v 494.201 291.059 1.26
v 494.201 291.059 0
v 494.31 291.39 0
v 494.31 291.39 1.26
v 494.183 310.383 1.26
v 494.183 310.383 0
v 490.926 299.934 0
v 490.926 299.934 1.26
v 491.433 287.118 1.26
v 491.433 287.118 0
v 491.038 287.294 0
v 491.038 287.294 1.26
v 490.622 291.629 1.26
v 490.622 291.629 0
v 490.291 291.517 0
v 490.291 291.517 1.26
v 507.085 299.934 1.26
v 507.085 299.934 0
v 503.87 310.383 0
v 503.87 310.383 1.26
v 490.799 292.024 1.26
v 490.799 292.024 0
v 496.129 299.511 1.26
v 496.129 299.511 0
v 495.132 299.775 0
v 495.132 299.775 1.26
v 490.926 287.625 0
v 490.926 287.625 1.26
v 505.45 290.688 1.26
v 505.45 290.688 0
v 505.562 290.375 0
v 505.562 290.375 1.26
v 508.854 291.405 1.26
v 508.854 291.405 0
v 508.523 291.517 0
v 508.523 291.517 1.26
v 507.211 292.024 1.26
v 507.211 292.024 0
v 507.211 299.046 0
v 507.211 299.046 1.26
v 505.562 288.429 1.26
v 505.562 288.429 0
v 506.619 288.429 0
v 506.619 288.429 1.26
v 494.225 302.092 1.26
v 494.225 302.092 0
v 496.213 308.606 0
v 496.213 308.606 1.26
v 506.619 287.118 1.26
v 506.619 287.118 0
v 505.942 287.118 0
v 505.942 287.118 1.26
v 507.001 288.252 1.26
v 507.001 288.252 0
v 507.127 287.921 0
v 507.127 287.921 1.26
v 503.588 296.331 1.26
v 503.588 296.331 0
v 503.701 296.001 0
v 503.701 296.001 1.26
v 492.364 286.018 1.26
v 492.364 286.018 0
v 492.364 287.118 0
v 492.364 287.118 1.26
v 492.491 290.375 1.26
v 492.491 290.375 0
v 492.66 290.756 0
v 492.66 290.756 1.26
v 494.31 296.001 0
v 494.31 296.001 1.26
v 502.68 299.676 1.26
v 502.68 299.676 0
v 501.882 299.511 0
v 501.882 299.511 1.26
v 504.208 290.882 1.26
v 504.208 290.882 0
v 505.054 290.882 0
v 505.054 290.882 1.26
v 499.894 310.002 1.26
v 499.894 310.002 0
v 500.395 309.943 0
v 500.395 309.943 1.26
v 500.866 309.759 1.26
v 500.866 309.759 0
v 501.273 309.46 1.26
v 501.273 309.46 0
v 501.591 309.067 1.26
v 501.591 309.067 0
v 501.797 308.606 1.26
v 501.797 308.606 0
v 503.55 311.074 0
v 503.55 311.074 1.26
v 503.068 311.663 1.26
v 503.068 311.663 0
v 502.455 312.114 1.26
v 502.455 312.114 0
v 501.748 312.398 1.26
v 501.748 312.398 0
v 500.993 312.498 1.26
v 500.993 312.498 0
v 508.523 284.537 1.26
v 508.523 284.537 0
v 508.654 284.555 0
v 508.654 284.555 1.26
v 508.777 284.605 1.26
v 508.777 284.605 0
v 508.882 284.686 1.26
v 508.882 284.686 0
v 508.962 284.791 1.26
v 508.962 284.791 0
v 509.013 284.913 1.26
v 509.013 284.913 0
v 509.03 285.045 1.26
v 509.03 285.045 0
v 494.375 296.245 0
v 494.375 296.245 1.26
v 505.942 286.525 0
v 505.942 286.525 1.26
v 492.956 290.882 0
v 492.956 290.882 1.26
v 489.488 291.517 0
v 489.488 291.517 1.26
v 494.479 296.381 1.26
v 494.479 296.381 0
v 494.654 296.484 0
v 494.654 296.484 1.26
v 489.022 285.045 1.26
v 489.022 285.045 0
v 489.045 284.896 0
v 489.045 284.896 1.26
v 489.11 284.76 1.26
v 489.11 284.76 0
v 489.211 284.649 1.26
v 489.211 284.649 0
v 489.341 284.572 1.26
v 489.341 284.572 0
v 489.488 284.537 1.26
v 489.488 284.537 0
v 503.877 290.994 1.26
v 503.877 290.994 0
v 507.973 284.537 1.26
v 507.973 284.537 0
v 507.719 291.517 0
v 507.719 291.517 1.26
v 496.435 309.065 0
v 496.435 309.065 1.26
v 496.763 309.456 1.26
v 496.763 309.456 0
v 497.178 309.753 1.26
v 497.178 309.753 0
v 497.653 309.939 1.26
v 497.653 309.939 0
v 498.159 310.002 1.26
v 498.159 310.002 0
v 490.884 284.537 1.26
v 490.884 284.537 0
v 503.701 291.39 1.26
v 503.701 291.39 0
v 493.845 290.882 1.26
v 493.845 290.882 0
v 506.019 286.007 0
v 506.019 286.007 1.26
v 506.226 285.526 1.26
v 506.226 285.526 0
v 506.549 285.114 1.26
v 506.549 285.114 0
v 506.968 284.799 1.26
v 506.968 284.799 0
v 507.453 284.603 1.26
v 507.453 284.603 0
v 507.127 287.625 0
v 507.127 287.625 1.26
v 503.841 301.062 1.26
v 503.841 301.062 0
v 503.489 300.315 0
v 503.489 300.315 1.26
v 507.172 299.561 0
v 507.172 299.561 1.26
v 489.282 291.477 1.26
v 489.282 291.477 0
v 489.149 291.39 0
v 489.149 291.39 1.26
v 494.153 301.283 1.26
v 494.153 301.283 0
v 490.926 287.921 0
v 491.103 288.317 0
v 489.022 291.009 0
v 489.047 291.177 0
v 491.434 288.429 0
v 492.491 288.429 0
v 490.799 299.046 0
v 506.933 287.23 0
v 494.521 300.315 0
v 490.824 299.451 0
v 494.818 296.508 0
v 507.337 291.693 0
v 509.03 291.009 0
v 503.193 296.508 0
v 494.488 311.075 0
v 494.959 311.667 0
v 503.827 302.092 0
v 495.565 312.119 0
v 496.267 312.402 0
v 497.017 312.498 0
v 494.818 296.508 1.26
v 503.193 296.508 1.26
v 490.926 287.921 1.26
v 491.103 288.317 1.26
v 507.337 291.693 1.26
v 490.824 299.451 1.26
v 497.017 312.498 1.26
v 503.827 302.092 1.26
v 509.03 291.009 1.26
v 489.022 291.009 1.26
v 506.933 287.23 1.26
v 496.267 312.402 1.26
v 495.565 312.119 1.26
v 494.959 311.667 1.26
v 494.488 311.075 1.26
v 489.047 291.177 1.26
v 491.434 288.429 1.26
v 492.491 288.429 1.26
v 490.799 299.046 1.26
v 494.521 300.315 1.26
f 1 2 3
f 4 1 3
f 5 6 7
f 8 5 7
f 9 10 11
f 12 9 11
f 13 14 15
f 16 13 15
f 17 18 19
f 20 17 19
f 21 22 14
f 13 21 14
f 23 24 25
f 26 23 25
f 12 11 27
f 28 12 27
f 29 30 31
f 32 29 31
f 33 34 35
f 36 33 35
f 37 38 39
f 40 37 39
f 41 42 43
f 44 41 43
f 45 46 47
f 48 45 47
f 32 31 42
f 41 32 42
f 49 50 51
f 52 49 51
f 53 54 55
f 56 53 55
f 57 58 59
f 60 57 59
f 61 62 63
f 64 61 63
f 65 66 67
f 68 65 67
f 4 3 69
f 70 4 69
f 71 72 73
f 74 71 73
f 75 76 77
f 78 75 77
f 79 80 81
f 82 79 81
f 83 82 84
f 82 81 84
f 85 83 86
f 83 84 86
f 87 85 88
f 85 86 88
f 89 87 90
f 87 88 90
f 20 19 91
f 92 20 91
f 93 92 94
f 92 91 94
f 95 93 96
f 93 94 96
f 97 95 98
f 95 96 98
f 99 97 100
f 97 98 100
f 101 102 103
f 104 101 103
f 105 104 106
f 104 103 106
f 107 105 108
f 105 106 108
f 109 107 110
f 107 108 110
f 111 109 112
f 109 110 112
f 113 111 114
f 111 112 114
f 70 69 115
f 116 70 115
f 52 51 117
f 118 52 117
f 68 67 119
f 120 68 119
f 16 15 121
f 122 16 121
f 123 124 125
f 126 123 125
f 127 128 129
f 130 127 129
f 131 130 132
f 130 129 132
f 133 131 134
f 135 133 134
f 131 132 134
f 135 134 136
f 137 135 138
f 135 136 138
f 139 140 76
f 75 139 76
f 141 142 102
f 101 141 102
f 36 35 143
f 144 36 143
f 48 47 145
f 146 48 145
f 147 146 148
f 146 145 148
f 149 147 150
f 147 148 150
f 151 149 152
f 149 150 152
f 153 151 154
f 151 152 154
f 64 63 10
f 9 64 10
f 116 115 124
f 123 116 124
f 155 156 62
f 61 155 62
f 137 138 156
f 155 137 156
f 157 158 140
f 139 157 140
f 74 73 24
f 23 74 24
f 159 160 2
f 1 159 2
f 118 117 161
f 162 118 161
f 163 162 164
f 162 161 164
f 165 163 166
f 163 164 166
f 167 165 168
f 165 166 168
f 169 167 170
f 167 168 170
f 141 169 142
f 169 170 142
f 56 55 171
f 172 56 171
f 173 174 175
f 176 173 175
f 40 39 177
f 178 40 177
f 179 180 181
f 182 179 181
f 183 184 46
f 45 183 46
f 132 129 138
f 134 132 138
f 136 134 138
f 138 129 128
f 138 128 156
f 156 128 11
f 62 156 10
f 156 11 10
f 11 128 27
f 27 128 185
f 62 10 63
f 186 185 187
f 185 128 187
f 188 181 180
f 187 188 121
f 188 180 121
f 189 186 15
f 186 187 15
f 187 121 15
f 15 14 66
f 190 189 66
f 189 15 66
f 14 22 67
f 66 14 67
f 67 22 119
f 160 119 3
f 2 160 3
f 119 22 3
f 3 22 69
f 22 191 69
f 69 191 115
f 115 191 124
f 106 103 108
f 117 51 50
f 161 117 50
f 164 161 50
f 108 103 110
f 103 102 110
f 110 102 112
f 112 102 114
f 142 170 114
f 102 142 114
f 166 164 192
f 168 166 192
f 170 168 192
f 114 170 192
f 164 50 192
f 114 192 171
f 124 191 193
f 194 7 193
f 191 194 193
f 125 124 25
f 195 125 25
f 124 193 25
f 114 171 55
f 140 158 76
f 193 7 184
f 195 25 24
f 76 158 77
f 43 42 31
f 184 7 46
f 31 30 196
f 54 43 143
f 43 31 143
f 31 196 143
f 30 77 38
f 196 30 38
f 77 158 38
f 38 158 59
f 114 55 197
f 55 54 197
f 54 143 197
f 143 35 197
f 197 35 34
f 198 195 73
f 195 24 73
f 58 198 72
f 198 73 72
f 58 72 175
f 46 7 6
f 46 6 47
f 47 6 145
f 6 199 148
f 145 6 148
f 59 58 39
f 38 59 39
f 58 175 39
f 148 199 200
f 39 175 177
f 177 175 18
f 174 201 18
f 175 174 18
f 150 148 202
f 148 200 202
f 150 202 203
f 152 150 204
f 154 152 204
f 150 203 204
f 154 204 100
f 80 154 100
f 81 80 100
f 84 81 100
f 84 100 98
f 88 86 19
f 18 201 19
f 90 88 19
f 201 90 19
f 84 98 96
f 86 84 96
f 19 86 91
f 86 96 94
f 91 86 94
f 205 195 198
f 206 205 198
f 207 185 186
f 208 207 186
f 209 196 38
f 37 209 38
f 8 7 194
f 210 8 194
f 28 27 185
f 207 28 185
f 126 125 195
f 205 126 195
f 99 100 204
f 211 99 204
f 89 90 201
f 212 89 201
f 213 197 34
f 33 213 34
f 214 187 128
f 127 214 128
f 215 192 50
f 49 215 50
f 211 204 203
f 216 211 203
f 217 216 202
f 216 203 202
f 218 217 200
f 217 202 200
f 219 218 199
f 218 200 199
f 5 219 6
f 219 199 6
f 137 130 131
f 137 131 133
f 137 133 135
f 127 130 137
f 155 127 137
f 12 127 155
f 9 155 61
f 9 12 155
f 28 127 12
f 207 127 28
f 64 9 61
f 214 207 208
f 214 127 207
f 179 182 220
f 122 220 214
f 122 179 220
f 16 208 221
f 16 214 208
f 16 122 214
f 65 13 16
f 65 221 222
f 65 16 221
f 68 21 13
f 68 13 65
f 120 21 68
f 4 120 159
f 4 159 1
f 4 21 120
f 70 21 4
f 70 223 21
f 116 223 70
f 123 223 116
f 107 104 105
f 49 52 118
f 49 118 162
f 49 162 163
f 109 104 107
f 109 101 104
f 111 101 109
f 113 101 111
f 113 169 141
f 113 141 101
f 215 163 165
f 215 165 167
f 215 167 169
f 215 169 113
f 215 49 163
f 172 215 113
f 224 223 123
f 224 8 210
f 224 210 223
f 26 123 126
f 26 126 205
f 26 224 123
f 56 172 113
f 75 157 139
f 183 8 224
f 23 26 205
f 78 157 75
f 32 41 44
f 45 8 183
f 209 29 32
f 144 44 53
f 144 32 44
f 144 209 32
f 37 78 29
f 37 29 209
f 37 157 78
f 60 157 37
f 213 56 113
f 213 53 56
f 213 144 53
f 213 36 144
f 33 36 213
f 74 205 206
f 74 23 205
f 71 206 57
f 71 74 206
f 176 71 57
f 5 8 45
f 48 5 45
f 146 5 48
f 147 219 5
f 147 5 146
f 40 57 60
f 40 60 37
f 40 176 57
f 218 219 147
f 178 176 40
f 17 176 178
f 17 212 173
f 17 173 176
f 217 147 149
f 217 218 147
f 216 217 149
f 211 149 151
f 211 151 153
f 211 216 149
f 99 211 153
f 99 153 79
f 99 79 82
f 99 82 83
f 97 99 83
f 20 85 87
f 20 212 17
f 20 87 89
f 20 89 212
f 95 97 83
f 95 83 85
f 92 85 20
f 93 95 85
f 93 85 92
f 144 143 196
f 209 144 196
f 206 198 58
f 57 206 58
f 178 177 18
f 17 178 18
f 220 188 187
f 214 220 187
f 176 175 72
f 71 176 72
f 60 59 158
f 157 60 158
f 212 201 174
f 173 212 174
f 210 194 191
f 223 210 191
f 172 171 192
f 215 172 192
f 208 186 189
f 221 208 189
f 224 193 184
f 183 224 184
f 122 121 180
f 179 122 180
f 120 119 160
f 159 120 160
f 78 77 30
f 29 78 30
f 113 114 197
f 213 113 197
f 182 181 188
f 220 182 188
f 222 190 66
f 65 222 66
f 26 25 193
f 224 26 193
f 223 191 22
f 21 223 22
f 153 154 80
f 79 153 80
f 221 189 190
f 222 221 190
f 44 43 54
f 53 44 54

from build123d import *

# Parameters (mm, degrees)
EXTRUDE_1_DEPTH = 1.26


with BuildPart() as part:
    # Model → 凸台-拉伸1 (new body)
    with BuildSketch(Plane.XY):
        with BuildLine():
            Line((490.799011507, 297.269554061), (490.799011507, 293.800954061))
            Line((490.799011507, 293.800954061), (490.799011507, 292.024354061))
            Line((490.799011507, 292.024354061), (490.622317978, 291.628783411))
            Line((490.622317978, 291.628783411), (490.291411507, 291.516754061))
            Line((490.291411507, 291.516754061), (489.487672027, 291.516754061))
            Line((489.487672027, 291.516754061), (489.281948064, 291.476958221))
            Line((489.281948064, 291.476958221), (489.149260696, 291.389854061))
            Line((489.149260696, 291.389854061), (489.046979347, 291.176662061))
            Line((489.046979347, 291.176662061), (489.022411507, 291.009154061))
            Line((489.022411507, 291.009154061), (489.022411507, 285.044854061))
            ThreePointArc((489.022411507, 285.044854061), (489.156337447, 284.700557005), (489.487711507, 284.537254061))
            Line((489.487711507, 284.537254061), (490.883611507, 284.537254061))
            Line((490.883611507, 284.537254061), (492.364111507, 286.017754061))
            Line((492.364111507, 286.017754061), (492.364111507, 287.117554061))
            Line((492.364111507, 287.117554061), (491.433481153, 287.117554061))
            Line((491.433481153, 287.117554061), (491.037940858, 287.29424759))
            Line((491.037940858, 287.29424759), (490.925911507, 287.625154061))
            Line((490.925911507, 287.625154061), (490.925911507, 287.921254061))
            Line((490.925911507, 287.921254061), (491.102605037, 288.31682471))
            Line((491.102605037, 288.31682471), (491.433511507, 288.428854061))
            Line((491.433511507, 288.428854061), (492.491011507, 288.428854061))
            Line((492.491011507, 288.428854061), (492.491011507, 290.374654061))
            Line((492.491011507, 290.374654061), (492.66027648, 290.75646672))
            Line((492.66027648, 290.75646672), (492.956311507, 290.882254061))
            Line((492.956311507, 290.882254061), (493.84460586, 290.882254061))
            Line((493.84460586, 290.882254061), (494.20148544, 291.05894759))
            Line((494.20148544, 291.05894759), (494.309911507, 291.389854061))
            Line((494.309911507, 291.389854061), (494.309911507, 296.000554061))
            Line((494.309911507, 296.000554061), (494.374646074, 296.245014221))
            Line((494.374646074, 296.245014221), (494.479015049, 296.381254061))
            Line((494.479015049, 296.381254061), (494.65360679, 296.483586221))
            Line((494.65360679, 296.483586221), (494.817511507, 296.508154061))
            Line((494.817511507, 296.508154061), (503.192882713, 296.508154061))
            Line((503.192882713, 296.508154061), (503.588482157, 296.331460531))
            Line((503.588482157, 296.331460531), (503.700511507, 296.000554061))
            Line((503.700511507, 296.000554061), (503.700511507, 291.389854061))
            Line((503.700511507, 291.389854061), (503.877205037, 290.994283411))
            Line((503.877205037, 290.994283411), (504.208111507, 290.882254061))
            Line((504.208111507, 290.882254061), (505.054032978, 290.882254061))
            Line((505.054032978, 290.882254061), (505.449682157, 290.688050362))
            Line((505.449682157, 290.688050362), (505.561711507, 290.374654061))
            Line((505.561711507, 290.374654061), (505.561711507, 288.428854061))
            Line((505.561711507, 288.428854061), (506.619129356, 288.428854061))
            Line((506.619129356, 288.428854061), (507.001024166, 288.252160531))
            Line((507.001024166, 288.252160531), (507.126811507, 287.921254061))
            Line((507.126811507, 287.921254061), (507.126811507, 287.625154061))
            Line((507.126811507, 287.625154061), (506.932607808, 287.229583411))
            Line((506.932607808, 287.229583411), (506.619211507, 287.117554061))
            Line((506.619211507, 287.117554061), (505.942411507, 287.117554061))
            Line((505.942411507, 287.117554061), (505.942411507, 286.525354055))
            ThreePointArc((505.942411507, 286.525354055), (506.549193576, 285.114196381), (507.972811507, 284.537254055))
            Line((507.972811507, 284.537254055), (508.522711502, 284.537254055))
            ThreePointArc((508.522711502, 284.537254055), (508.881638908, 284.685926655), (509.030311507, 285.044854061))
            Line((509.030311507, 285.044854061), (509.030311507, 291.009154061))
            Line((509.030311507, 291.009154061), (508.853617978, 291.40472471))
            Line((508.853617978, 291.40472471), (508.522711507, 291.516754061))
            Line((508.522711507, 291.516754061), (507.718966182, 291.516754061))
            Line((507.718966182, 291.516754061), (507.337198848, 291.69344759))
            Line((507.337198848, 291.69344759), (507.211411507, 292.024354061))
            Line((507.211411507, 292.024354061), (507.211411507, 299.046154061))
            Line((507.211411507, 299.046154061), (507.171615667, 299.56111223))
            Line((507.171615667, 299.56111223), (507.084511507, 299.934454061))
            Line((507.084511507, 299.934454061), (503.869711507, 310.382554061))
            ThreePointArc((503.869711507, 310.382554061), (502.775635028, 311.908062049), (500.993311507, 312.497554061))
            Line((500.993311507, 312.497554061), (497.017111507, 312.497554061))
            ThreePointArc((497.017111507, 312.497554061), (495.247553689, 311.912414538), (494.183011507, 310.382554061))
            Line((494.183011507, 310.382554061), (490.925864157, 299.934454061))
            Line((490.925864157, 299.934454061), (490.823579347, 299.450764051))
            Line((490.823579347, 299.450764051), (490.799011507, 299.046154061))
            Line((490.799011507, 299.046154061), (490.799011507, 297.269554061))
        make_face()
        with BuildLine():
            Line((499.005211507, 310.001854061), (499.893511507, 310.001854061))
            ThreePointArc((499.893511507, 310.001854061), (501.078970997, 309.62259882), (501.797011507, 308.605954061))
            Line((501.797011507, 308.605954061), (503.827347931, 302.091754061))
            Line((503.827347931, 302.091754061), (503.840525184, 301.061837722))
            Line((503.840525184, 301.061837722), (503.4889366, 300.315154061))
            Line((503.4889366, 300.315154061), (502.680170534, 299.676222374))
            Line((502.680170534, 299.676222374), (501.881611507, 299.511454061))
            Line((501.881611507, 299.511454061), (499.005211507, 299.511454061))
            Line((499.005211507, 299.511454061), (496.12871426, 299.511454061))
            Line((496.12871426, 299.511454061), (495.132361574, 299.775167827))
            Line((495.132361574, 299.775167827), (494.521372494, 300.315154061))
            Line((494.521372494, 300.315154061), (494.15297783, 301.28253408))
            Line((494.15297783, 301.28253408), (494.225311507, 302.091754061))
            Line((494.225311507, 302.091754061), (496.213411507, 308.605954061))
            ThreePointArc((496.213411507, 308.605954061), (496.961295967, 309.617562087), (498.159211507, 310.001854061))
            Line((498.159211507, 310.001854061), (499.005211507, 310.001854061))
        make_face(mode=Mode.SUBTRACT)
    extrude(amount=EXTRUDE_1_DEPTH)


solid = part.part
